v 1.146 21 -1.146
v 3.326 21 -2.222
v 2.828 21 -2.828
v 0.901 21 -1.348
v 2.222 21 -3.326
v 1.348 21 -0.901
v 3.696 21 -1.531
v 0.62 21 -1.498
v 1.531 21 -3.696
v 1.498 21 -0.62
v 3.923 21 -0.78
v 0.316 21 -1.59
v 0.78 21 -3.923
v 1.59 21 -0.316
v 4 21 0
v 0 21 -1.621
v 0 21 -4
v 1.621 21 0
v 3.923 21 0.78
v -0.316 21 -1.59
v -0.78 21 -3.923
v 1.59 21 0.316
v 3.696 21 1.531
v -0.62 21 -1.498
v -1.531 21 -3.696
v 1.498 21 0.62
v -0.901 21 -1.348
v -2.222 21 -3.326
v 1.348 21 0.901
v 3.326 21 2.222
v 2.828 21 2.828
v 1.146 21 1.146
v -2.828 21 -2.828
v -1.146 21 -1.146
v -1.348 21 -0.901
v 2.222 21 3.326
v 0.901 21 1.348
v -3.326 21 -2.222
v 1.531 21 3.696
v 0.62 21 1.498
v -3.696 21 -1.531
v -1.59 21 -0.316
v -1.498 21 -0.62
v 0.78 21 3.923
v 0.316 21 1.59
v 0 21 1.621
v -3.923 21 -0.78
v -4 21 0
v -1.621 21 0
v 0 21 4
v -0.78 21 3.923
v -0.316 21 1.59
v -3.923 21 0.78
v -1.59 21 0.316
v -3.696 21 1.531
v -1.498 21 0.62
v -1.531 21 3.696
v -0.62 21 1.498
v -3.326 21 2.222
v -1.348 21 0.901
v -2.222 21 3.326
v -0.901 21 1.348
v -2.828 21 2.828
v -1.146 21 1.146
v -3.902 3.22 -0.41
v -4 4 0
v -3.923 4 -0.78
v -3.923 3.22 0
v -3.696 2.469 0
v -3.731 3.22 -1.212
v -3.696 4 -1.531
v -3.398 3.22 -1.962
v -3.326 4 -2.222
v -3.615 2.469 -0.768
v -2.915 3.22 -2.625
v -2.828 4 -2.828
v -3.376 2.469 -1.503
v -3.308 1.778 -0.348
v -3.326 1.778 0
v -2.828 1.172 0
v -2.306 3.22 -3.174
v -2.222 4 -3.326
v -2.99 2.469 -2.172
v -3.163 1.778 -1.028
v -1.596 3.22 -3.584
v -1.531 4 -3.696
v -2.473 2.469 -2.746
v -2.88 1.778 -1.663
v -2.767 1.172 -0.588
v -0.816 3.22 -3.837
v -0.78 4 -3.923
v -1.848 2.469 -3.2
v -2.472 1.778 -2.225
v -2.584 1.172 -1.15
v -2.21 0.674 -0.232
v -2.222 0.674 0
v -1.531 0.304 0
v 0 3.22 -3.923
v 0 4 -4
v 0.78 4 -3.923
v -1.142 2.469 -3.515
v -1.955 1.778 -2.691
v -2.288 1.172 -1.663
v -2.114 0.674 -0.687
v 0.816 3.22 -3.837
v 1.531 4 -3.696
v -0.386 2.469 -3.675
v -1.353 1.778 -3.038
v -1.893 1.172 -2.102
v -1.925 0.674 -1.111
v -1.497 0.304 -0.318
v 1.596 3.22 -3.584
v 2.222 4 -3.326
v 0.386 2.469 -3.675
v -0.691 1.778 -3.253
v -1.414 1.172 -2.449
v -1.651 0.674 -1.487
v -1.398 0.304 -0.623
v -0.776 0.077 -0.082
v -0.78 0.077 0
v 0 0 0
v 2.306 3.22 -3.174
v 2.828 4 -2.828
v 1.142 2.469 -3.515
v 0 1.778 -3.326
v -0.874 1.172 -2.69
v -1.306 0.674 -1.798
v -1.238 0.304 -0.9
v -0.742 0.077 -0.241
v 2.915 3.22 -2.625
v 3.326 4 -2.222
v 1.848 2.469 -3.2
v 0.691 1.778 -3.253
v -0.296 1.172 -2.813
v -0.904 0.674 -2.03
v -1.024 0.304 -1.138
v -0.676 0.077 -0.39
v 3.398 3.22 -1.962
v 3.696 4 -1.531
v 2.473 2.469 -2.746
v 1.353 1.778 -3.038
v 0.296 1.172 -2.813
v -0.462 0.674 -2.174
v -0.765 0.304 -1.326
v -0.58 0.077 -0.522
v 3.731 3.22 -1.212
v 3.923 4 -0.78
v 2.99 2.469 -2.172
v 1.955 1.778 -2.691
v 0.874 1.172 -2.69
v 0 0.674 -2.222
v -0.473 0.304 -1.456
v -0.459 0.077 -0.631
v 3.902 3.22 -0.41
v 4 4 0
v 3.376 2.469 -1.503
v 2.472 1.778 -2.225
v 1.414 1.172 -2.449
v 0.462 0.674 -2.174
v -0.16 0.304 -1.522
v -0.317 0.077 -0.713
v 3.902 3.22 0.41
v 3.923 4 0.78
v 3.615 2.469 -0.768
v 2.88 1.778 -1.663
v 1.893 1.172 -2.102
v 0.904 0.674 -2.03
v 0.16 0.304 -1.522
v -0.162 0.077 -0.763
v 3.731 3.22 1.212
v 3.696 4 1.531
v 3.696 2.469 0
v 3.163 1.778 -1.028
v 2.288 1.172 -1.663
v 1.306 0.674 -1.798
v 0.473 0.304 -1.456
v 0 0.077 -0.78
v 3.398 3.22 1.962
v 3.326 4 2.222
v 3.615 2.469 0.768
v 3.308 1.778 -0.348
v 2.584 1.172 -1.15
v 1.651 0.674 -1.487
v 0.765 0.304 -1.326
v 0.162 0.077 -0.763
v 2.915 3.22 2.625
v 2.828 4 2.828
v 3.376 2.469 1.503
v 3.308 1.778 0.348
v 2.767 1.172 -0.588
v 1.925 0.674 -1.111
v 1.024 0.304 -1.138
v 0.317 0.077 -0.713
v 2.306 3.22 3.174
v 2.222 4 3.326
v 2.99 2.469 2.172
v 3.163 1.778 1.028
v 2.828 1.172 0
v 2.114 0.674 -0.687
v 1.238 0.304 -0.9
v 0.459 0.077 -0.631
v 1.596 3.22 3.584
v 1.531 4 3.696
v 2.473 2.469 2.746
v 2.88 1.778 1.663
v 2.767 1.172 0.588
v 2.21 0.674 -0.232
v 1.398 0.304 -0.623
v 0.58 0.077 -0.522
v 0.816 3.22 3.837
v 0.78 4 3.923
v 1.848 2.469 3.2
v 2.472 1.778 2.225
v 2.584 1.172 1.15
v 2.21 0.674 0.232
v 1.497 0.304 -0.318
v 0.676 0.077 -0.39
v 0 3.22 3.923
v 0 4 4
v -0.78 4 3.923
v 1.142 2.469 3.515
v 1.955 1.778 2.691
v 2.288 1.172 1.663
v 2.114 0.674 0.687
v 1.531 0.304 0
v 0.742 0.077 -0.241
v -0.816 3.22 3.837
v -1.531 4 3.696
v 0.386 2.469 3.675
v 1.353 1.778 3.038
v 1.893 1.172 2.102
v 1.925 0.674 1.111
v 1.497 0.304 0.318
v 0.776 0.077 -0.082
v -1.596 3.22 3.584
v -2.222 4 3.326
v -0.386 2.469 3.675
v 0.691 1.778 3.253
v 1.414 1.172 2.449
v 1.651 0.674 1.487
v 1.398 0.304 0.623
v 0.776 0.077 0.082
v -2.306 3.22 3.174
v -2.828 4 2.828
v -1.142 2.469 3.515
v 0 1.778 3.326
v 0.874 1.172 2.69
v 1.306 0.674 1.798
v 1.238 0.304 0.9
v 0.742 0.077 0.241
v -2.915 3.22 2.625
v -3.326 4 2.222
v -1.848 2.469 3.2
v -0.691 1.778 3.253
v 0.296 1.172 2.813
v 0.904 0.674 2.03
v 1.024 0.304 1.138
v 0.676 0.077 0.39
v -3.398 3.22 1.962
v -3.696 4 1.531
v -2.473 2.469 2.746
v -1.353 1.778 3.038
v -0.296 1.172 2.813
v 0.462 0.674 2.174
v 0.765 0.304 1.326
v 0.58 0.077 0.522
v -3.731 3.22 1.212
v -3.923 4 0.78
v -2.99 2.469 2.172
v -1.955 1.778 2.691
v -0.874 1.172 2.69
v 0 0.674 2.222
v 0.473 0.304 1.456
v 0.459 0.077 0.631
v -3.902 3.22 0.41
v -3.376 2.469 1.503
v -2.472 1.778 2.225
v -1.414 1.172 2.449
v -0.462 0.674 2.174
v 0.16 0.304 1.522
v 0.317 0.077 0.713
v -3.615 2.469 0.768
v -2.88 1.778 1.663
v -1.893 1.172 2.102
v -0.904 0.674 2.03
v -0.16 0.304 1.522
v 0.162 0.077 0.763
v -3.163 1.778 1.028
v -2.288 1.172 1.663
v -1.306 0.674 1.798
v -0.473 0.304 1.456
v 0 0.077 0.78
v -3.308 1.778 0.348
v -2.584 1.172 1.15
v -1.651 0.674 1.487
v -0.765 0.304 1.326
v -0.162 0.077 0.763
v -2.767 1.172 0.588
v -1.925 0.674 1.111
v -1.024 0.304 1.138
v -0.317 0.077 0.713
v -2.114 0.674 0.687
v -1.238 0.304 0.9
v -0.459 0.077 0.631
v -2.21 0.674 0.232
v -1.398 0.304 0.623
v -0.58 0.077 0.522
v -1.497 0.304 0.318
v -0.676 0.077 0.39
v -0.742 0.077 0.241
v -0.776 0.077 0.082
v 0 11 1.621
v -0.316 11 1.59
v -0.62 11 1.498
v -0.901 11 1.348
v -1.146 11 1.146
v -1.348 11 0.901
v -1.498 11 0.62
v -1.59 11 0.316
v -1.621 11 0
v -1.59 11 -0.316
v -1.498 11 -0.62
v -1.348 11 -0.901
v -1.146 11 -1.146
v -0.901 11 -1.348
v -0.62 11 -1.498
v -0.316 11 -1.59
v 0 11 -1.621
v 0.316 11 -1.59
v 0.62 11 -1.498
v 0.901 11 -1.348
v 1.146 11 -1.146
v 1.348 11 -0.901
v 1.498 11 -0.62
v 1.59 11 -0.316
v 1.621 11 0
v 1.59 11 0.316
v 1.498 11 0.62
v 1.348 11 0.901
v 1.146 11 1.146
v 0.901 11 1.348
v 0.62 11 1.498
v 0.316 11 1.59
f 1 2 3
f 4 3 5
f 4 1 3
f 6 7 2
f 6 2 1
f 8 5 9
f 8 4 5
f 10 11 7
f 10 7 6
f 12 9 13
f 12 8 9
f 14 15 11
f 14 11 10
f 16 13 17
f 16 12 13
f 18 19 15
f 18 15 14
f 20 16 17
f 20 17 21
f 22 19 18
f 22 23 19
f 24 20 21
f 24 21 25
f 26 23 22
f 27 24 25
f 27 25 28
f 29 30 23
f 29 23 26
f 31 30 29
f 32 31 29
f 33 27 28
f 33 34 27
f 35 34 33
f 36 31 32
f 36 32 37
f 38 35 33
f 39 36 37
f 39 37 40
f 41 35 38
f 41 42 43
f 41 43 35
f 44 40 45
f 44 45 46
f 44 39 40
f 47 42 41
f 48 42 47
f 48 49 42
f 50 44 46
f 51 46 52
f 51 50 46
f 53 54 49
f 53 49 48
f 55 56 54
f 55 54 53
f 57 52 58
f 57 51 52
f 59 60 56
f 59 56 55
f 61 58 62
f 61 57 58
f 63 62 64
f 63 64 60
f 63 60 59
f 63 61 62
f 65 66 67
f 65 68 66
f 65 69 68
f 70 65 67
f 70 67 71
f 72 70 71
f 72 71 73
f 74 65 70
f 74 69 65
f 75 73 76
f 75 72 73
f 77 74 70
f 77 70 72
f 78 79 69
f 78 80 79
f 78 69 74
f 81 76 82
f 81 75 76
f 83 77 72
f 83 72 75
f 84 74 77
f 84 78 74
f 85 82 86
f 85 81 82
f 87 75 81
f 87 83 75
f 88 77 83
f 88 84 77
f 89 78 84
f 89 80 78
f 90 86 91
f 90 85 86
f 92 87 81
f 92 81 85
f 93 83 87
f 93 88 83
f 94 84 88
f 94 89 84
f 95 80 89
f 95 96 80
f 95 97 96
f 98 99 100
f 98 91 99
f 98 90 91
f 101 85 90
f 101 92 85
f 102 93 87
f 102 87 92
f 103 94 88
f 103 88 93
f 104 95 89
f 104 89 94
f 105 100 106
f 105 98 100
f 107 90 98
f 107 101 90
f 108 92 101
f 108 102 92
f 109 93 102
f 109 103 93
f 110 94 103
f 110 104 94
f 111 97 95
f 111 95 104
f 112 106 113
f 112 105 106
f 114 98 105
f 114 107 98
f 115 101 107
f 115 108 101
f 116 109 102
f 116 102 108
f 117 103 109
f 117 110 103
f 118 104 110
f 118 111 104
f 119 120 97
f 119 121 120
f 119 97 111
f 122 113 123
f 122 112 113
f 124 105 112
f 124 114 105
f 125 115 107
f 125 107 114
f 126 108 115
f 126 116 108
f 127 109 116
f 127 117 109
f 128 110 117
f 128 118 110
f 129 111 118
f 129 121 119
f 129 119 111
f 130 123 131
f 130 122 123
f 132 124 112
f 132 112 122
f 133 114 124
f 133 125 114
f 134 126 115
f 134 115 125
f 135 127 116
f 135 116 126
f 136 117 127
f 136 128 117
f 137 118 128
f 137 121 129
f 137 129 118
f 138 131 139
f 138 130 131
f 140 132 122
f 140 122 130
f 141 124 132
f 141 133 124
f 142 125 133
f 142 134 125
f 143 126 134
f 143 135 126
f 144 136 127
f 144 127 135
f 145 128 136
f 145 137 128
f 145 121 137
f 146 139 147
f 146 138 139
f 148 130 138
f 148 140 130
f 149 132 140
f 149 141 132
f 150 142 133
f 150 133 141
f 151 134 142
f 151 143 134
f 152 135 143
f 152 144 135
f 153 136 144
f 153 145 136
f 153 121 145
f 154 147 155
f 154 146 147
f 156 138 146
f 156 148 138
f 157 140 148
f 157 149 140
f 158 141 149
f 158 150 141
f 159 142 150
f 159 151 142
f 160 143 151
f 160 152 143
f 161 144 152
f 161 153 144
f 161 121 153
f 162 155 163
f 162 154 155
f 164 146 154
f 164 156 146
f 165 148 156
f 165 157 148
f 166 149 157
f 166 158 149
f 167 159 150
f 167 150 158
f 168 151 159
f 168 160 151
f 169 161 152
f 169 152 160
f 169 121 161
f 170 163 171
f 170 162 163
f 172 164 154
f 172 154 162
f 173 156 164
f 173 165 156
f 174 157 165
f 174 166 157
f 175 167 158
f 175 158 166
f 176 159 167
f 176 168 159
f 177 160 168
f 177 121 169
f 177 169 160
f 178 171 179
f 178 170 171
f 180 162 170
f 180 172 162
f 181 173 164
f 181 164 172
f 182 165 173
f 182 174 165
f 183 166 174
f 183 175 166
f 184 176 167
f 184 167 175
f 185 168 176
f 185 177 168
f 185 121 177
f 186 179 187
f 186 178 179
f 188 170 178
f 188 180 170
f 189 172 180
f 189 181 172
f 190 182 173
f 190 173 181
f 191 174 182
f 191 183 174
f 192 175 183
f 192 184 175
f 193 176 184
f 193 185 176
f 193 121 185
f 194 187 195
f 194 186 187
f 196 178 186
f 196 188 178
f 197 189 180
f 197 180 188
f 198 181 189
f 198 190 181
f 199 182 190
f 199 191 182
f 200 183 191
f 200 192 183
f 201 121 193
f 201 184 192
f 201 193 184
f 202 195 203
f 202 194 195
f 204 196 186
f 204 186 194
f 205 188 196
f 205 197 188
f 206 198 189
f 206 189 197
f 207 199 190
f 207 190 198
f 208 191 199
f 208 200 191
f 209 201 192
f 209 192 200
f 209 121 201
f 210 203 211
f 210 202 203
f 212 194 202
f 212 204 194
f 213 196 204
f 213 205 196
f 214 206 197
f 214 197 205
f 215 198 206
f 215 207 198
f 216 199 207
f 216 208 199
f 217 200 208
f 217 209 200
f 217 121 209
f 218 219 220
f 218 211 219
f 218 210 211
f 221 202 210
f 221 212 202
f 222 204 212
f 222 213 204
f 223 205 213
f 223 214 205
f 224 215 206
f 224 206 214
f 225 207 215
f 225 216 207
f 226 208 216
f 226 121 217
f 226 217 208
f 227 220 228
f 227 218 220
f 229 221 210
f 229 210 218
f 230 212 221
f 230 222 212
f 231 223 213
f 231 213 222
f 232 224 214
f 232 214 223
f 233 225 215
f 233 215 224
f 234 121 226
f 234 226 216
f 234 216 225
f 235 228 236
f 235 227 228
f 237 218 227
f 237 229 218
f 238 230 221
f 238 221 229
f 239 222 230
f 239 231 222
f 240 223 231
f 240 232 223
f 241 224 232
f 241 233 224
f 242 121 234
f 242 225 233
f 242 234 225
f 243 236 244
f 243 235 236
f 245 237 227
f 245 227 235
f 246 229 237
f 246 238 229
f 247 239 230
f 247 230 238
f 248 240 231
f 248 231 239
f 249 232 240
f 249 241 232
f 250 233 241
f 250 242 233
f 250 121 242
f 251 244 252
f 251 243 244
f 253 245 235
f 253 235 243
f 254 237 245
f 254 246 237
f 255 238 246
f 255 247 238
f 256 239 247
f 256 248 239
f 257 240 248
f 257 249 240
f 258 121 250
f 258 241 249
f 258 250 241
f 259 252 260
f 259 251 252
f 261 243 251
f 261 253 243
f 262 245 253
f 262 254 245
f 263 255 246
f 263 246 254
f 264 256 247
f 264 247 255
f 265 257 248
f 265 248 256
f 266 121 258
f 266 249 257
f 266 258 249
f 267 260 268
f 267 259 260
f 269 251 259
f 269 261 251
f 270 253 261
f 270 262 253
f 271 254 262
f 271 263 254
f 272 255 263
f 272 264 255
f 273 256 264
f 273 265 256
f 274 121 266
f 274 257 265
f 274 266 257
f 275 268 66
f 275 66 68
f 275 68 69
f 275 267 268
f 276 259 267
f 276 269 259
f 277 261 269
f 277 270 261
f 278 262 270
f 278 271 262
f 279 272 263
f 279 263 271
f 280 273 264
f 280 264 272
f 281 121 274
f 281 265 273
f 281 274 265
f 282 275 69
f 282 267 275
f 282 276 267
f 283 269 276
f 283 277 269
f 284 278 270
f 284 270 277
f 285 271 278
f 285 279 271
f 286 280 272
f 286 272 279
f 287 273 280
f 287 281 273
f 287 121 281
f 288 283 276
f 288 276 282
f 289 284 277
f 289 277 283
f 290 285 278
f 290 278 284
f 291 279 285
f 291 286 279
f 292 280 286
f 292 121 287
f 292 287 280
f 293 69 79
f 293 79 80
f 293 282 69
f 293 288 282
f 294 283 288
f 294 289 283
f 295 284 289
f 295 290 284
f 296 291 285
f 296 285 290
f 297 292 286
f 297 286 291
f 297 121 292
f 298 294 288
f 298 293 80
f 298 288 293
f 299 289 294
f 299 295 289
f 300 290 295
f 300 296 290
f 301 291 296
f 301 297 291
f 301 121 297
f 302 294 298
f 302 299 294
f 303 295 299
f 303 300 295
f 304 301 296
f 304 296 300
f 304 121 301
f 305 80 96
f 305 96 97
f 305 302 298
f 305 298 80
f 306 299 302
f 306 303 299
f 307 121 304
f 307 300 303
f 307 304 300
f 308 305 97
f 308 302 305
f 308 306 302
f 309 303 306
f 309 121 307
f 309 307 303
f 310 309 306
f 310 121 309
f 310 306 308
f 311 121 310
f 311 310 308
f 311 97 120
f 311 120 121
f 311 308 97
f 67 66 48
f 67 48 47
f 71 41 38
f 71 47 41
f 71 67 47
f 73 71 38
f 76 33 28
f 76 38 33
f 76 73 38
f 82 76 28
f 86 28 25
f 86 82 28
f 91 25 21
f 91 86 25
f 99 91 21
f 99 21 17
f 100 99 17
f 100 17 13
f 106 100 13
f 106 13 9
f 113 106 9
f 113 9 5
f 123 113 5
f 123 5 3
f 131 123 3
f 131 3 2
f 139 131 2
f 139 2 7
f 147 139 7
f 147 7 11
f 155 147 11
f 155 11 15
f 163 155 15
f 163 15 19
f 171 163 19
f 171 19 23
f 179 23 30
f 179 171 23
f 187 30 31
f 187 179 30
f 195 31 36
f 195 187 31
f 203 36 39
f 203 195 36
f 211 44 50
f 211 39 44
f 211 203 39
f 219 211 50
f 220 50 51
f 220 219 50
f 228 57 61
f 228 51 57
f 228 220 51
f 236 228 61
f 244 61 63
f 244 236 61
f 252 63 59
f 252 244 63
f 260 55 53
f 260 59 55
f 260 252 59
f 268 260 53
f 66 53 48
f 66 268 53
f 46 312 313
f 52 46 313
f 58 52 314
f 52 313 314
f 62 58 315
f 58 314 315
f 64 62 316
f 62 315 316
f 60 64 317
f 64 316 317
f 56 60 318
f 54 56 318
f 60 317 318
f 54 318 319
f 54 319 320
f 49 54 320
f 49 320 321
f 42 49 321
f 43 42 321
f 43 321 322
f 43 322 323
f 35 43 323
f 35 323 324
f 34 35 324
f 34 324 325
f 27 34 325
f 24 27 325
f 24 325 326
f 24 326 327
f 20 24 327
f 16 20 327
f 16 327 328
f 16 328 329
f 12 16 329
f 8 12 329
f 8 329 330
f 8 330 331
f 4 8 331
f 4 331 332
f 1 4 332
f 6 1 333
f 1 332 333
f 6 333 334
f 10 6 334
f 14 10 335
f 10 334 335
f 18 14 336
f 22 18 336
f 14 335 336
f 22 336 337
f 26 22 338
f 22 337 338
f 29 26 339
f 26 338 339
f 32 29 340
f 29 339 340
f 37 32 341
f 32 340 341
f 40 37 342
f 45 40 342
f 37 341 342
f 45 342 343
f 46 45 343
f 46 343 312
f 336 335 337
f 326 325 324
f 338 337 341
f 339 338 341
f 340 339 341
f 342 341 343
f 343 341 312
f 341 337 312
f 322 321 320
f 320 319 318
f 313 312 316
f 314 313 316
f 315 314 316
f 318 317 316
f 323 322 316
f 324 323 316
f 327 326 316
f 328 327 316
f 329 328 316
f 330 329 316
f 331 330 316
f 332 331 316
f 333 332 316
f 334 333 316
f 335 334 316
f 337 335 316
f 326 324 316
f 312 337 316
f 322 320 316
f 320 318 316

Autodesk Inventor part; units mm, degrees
ref_plane "YZ Plane" through (0, 0, 0) normal (1, 0, 0) x (0, 1, 0)
ref_plane "XZ Plane" through (0, 0, 0) normal (0, 1, 0) x (-1, 0, 0)
ref_plane "XY Plane" through (0, 0, 0) normal (0, 0, 1) x (1, 0, 0)
sketch "Esboço1" plane through (0, 0, 0) normal (0, 1, 0) x (-1, 0, 0)
  circle A0 centre (0, 0) radius 4
  dimension "d0" = 8
extrude "Extrusão1" add sketch "Esboço1" along normal blind 21
fillet "Arredondamento1" radius 4 1 edges at (4, 0, 0)
sketch "Esboço2" plane through (0, 21, 0) normal (0, 1, 0) x (1, 0, 0)
  point P0 (0, 0)
  point P1 (0, 0)
hole "Furo1" at (0, 21, 0) direction (0, -1, 0) diameter 3.242 depth 10 thread size "M4x0.7" class "6H" standard "ISO Metric profile"
properties part number "Dedo-02"
